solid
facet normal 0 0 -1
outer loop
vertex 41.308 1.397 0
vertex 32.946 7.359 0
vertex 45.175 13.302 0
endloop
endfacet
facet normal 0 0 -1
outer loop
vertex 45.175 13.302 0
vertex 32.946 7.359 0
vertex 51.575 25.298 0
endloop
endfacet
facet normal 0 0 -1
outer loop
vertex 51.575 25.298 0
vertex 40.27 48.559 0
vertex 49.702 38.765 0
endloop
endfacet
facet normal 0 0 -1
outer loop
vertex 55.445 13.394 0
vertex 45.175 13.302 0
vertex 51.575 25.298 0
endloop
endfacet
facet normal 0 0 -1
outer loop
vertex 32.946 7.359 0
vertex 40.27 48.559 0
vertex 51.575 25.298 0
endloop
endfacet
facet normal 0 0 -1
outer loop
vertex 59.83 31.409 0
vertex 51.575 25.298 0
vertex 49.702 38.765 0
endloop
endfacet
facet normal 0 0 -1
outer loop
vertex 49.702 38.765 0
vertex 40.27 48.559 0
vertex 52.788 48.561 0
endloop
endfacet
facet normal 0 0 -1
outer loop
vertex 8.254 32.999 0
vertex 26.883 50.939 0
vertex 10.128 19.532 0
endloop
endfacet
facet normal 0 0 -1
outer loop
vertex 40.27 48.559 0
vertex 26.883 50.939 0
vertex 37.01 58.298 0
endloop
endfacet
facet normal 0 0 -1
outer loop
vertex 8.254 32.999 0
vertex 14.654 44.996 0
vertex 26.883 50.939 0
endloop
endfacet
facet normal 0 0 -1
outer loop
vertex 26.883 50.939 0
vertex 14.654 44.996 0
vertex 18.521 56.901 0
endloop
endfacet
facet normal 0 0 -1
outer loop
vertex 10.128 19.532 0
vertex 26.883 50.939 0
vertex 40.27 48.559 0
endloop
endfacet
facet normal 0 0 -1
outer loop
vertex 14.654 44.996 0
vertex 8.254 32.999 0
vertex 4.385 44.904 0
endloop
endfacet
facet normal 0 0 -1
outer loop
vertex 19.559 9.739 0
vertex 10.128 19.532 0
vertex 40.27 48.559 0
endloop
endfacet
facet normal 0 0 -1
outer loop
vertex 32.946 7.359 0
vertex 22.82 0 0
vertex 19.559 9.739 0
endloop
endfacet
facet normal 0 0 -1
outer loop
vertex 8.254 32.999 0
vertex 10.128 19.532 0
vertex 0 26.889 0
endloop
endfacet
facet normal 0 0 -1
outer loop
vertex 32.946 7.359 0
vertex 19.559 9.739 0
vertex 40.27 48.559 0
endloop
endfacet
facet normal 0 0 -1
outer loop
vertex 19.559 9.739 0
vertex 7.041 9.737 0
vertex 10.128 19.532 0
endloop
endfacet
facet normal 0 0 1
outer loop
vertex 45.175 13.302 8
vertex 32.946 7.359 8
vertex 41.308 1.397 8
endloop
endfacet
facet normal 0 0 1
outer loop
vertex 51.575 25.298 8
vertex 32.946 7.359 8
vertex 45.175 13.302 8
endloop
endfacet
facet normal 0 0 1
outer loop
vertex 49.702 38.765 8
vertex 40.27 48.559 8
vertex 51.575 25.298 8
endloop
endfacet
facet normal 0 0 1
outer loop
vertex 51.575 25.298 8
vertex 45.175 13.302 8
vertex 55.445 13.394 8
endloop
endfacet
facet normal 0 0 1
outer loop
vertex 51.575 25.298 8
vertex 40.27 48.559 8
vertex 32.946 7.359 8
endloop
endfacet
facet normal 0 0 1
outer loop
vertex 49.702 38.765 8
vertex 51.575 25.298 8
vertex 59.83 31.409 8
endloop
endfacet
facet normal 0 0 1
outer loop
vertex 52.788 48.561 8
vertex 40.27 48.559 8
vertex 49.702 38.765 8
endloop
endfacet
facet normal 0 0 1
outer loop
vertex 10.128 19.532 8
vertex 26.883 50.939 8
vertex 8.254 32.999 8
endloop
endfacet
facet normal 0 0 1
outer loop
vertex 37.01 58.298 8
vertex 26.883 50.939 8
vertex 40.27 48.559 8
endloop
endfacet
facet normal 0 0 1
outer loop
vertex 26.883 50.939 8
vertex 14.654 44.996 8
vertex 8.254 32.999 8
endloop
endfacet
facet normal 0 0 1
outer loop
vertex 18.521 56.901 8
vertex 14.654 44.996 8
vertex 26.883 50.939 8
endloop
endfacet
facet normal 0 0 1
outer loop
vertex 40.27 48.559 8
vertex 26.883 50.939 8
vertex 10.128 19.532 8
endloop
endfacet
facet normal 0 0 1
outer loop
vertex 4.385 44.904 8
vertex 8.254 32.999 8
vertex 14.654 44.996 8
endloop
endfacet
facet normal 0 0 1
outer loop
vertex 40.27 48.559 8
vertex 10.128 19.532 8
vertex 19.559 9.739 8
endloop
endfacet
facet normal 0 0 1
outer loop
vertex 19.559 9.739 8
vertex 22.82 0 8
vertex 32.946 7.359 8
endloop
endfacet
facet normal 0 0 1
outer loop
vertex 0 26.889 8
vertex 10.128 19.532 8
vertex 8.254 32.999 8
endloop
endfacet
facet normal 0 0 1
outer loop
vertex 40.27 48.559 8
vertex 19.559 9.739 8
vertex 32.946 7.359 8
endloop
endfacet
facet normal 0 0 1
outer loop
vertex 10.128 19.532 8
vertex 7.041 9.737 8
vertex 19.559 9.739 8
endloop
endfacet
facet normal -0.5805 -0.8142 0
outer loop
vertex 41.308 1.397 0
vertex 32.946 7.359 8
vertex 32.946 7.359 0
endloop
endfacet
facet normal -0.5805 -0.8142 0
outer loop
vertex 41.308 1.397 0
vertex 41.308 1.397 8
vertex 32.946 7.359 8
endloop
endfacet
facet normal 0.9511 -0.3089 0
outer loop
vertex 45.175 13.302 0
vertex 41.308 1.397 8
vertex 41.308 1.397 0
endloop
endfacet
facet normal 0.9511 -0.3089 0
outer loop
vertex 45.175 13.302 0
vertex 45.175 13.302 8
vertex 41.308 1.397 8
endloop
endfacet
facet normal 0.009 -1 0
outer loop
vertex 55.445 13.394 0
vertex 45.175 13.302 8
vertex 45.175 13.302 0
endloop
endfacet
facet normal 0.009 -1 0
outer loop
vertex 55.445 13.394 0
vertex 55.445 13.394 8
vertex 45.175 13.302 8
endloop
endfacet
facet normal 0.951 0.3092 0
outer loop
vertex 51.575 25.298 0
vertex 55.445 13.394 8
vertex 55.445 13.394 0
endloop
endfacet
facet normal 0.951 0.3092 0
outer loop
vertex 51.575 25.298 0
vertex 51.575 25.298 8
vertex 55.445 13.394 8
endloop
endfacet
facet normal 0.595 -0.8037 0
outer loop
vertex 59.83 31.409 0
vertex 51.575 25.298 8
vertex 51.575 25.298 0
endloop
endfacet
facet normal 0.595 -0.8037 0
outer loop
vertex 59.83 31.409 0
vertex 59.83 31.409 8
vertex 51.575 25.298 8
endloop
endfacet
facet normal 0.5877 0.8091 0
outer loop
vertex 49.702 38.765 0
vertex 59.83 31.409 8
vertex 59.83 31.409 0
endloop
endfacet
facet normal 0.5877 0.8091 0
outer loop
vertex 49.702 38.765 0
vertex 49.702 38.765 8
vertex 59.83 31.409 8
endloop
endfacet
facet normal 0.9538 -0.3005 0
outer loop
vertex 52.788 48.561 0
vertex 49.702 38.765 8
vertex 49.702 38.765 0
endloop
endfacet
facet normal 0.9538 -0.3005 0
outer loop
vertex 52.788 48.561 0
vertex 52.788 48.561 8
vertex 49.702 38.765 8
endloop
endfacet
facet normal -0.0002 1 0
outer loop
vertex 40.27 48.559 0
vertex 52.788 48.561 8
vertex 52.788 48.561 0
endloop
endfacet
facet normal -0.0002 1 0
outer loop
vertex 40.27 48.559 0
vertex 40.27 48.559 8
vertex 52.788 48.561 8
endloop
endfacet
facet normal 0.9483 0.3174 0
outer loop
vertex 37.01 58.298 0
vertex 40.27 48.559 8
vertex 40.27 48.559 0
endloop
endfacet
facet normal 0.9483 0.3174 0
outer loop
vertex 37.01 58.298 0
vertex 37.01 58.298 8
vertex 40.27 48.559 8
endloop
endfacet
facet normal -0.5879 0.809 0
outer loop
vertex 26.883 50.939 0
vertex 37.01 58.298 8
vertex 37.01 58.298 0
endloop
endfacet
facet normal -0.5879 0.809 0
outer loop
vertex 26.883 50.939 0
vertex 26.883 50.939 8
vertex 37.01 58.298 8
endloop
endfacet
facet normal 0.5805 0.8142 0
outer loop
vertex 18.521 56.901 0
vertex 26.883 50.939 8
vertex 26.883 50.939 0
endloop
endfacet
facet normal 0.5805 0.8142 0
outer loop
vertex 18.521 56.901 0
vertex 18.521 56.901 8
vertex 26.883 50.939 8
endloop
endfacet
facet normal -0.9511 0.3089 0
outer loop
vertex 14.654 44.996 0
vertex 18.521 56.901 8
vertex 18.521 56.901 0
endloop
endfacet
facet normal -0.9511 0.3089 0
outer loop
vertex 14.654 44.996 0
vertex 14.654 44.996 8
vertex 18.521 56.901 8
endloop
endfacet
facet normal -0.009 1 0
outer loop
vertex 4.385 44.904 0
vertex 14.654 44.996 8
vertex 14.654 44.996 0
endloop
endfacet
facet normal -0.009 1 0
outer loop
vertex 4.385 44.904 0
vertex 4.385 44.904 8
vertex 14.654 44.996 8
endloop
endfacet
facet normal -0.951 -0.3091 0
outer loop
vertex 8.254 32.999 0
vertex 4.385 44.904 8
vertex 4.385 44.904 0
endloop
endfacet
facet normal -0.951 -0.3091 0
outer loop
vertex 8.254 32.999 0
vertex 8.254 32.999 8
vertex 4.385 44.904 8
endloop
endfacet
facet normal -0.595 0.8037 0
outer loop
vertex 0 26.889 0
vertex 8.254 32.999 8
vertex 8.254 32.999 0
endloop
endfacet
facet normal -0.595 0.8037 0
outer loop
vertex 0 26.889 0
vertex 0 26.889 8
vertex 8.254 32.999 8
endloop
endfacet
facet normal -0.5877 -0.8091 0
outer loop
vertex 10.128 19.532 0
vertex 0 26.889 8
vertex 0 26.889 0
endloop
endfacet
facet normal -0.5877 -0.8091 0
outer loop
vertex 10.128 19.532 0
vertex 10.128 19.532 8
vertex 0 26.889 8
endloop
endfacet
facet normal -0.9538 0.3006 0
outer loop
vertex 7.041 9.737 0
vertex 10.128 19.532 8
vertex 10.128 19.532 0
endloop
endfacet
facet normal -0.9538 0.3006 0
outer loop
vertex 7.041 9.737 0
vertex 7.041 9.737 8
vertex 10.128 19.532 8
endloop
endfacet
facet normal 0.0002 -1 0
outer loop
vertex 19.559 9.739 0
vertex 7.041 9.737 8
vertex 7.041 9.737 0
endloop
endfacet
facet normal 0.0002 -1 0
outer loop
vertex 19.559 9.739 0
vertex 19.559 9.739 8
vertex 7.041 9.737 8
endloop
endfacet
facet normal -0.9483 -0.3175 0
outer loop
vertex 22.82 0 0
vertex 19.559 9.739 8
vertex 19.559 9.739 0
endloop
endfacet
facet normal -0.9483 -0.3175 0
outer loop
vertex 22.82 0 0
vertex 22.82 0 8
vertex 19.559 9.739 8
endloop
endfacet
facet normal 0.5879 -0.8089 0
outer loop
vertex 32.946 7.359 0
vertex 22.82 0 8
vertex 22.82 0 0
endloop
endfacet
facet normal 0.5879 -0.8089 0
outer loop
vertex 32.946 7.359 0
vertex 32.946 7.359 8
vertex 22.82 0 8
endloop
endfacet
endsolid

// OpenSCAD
$fn = 32;

// ----------------------------------------------------------------------
// Chain sprocket: 10 teeth, 22 mm root radius
// ----------------------------------------------------------------------

// --- parameters (mm) ---
profile_height = 8;       // extrusion height
profile_points = 20;      // points of the closed outline

profile = [[51.575, 25.298], [59.83, 31.409], [49.702, 38.765], [52.788, 48.561], [40.27, 48.559], [37.01, 58.298], [26.883, 50.939], [18.521, 56.901], [14.654, 44.996], [4.385, 44.904], [8.254, 32.999], [0, 26.889], [10.128, 19.532], [7.041, 9.737], [19.559, 9.739], [22.82, 0], [32.946, 7.359], [41.308, 1.397], [45.175, 13.302], [55.445, 13.394]];  // single closed polygon, 20 points, counter clockwise

// --- the one profile operation ---
linear_extrude(height = profile_height) polygon(points = profile);
